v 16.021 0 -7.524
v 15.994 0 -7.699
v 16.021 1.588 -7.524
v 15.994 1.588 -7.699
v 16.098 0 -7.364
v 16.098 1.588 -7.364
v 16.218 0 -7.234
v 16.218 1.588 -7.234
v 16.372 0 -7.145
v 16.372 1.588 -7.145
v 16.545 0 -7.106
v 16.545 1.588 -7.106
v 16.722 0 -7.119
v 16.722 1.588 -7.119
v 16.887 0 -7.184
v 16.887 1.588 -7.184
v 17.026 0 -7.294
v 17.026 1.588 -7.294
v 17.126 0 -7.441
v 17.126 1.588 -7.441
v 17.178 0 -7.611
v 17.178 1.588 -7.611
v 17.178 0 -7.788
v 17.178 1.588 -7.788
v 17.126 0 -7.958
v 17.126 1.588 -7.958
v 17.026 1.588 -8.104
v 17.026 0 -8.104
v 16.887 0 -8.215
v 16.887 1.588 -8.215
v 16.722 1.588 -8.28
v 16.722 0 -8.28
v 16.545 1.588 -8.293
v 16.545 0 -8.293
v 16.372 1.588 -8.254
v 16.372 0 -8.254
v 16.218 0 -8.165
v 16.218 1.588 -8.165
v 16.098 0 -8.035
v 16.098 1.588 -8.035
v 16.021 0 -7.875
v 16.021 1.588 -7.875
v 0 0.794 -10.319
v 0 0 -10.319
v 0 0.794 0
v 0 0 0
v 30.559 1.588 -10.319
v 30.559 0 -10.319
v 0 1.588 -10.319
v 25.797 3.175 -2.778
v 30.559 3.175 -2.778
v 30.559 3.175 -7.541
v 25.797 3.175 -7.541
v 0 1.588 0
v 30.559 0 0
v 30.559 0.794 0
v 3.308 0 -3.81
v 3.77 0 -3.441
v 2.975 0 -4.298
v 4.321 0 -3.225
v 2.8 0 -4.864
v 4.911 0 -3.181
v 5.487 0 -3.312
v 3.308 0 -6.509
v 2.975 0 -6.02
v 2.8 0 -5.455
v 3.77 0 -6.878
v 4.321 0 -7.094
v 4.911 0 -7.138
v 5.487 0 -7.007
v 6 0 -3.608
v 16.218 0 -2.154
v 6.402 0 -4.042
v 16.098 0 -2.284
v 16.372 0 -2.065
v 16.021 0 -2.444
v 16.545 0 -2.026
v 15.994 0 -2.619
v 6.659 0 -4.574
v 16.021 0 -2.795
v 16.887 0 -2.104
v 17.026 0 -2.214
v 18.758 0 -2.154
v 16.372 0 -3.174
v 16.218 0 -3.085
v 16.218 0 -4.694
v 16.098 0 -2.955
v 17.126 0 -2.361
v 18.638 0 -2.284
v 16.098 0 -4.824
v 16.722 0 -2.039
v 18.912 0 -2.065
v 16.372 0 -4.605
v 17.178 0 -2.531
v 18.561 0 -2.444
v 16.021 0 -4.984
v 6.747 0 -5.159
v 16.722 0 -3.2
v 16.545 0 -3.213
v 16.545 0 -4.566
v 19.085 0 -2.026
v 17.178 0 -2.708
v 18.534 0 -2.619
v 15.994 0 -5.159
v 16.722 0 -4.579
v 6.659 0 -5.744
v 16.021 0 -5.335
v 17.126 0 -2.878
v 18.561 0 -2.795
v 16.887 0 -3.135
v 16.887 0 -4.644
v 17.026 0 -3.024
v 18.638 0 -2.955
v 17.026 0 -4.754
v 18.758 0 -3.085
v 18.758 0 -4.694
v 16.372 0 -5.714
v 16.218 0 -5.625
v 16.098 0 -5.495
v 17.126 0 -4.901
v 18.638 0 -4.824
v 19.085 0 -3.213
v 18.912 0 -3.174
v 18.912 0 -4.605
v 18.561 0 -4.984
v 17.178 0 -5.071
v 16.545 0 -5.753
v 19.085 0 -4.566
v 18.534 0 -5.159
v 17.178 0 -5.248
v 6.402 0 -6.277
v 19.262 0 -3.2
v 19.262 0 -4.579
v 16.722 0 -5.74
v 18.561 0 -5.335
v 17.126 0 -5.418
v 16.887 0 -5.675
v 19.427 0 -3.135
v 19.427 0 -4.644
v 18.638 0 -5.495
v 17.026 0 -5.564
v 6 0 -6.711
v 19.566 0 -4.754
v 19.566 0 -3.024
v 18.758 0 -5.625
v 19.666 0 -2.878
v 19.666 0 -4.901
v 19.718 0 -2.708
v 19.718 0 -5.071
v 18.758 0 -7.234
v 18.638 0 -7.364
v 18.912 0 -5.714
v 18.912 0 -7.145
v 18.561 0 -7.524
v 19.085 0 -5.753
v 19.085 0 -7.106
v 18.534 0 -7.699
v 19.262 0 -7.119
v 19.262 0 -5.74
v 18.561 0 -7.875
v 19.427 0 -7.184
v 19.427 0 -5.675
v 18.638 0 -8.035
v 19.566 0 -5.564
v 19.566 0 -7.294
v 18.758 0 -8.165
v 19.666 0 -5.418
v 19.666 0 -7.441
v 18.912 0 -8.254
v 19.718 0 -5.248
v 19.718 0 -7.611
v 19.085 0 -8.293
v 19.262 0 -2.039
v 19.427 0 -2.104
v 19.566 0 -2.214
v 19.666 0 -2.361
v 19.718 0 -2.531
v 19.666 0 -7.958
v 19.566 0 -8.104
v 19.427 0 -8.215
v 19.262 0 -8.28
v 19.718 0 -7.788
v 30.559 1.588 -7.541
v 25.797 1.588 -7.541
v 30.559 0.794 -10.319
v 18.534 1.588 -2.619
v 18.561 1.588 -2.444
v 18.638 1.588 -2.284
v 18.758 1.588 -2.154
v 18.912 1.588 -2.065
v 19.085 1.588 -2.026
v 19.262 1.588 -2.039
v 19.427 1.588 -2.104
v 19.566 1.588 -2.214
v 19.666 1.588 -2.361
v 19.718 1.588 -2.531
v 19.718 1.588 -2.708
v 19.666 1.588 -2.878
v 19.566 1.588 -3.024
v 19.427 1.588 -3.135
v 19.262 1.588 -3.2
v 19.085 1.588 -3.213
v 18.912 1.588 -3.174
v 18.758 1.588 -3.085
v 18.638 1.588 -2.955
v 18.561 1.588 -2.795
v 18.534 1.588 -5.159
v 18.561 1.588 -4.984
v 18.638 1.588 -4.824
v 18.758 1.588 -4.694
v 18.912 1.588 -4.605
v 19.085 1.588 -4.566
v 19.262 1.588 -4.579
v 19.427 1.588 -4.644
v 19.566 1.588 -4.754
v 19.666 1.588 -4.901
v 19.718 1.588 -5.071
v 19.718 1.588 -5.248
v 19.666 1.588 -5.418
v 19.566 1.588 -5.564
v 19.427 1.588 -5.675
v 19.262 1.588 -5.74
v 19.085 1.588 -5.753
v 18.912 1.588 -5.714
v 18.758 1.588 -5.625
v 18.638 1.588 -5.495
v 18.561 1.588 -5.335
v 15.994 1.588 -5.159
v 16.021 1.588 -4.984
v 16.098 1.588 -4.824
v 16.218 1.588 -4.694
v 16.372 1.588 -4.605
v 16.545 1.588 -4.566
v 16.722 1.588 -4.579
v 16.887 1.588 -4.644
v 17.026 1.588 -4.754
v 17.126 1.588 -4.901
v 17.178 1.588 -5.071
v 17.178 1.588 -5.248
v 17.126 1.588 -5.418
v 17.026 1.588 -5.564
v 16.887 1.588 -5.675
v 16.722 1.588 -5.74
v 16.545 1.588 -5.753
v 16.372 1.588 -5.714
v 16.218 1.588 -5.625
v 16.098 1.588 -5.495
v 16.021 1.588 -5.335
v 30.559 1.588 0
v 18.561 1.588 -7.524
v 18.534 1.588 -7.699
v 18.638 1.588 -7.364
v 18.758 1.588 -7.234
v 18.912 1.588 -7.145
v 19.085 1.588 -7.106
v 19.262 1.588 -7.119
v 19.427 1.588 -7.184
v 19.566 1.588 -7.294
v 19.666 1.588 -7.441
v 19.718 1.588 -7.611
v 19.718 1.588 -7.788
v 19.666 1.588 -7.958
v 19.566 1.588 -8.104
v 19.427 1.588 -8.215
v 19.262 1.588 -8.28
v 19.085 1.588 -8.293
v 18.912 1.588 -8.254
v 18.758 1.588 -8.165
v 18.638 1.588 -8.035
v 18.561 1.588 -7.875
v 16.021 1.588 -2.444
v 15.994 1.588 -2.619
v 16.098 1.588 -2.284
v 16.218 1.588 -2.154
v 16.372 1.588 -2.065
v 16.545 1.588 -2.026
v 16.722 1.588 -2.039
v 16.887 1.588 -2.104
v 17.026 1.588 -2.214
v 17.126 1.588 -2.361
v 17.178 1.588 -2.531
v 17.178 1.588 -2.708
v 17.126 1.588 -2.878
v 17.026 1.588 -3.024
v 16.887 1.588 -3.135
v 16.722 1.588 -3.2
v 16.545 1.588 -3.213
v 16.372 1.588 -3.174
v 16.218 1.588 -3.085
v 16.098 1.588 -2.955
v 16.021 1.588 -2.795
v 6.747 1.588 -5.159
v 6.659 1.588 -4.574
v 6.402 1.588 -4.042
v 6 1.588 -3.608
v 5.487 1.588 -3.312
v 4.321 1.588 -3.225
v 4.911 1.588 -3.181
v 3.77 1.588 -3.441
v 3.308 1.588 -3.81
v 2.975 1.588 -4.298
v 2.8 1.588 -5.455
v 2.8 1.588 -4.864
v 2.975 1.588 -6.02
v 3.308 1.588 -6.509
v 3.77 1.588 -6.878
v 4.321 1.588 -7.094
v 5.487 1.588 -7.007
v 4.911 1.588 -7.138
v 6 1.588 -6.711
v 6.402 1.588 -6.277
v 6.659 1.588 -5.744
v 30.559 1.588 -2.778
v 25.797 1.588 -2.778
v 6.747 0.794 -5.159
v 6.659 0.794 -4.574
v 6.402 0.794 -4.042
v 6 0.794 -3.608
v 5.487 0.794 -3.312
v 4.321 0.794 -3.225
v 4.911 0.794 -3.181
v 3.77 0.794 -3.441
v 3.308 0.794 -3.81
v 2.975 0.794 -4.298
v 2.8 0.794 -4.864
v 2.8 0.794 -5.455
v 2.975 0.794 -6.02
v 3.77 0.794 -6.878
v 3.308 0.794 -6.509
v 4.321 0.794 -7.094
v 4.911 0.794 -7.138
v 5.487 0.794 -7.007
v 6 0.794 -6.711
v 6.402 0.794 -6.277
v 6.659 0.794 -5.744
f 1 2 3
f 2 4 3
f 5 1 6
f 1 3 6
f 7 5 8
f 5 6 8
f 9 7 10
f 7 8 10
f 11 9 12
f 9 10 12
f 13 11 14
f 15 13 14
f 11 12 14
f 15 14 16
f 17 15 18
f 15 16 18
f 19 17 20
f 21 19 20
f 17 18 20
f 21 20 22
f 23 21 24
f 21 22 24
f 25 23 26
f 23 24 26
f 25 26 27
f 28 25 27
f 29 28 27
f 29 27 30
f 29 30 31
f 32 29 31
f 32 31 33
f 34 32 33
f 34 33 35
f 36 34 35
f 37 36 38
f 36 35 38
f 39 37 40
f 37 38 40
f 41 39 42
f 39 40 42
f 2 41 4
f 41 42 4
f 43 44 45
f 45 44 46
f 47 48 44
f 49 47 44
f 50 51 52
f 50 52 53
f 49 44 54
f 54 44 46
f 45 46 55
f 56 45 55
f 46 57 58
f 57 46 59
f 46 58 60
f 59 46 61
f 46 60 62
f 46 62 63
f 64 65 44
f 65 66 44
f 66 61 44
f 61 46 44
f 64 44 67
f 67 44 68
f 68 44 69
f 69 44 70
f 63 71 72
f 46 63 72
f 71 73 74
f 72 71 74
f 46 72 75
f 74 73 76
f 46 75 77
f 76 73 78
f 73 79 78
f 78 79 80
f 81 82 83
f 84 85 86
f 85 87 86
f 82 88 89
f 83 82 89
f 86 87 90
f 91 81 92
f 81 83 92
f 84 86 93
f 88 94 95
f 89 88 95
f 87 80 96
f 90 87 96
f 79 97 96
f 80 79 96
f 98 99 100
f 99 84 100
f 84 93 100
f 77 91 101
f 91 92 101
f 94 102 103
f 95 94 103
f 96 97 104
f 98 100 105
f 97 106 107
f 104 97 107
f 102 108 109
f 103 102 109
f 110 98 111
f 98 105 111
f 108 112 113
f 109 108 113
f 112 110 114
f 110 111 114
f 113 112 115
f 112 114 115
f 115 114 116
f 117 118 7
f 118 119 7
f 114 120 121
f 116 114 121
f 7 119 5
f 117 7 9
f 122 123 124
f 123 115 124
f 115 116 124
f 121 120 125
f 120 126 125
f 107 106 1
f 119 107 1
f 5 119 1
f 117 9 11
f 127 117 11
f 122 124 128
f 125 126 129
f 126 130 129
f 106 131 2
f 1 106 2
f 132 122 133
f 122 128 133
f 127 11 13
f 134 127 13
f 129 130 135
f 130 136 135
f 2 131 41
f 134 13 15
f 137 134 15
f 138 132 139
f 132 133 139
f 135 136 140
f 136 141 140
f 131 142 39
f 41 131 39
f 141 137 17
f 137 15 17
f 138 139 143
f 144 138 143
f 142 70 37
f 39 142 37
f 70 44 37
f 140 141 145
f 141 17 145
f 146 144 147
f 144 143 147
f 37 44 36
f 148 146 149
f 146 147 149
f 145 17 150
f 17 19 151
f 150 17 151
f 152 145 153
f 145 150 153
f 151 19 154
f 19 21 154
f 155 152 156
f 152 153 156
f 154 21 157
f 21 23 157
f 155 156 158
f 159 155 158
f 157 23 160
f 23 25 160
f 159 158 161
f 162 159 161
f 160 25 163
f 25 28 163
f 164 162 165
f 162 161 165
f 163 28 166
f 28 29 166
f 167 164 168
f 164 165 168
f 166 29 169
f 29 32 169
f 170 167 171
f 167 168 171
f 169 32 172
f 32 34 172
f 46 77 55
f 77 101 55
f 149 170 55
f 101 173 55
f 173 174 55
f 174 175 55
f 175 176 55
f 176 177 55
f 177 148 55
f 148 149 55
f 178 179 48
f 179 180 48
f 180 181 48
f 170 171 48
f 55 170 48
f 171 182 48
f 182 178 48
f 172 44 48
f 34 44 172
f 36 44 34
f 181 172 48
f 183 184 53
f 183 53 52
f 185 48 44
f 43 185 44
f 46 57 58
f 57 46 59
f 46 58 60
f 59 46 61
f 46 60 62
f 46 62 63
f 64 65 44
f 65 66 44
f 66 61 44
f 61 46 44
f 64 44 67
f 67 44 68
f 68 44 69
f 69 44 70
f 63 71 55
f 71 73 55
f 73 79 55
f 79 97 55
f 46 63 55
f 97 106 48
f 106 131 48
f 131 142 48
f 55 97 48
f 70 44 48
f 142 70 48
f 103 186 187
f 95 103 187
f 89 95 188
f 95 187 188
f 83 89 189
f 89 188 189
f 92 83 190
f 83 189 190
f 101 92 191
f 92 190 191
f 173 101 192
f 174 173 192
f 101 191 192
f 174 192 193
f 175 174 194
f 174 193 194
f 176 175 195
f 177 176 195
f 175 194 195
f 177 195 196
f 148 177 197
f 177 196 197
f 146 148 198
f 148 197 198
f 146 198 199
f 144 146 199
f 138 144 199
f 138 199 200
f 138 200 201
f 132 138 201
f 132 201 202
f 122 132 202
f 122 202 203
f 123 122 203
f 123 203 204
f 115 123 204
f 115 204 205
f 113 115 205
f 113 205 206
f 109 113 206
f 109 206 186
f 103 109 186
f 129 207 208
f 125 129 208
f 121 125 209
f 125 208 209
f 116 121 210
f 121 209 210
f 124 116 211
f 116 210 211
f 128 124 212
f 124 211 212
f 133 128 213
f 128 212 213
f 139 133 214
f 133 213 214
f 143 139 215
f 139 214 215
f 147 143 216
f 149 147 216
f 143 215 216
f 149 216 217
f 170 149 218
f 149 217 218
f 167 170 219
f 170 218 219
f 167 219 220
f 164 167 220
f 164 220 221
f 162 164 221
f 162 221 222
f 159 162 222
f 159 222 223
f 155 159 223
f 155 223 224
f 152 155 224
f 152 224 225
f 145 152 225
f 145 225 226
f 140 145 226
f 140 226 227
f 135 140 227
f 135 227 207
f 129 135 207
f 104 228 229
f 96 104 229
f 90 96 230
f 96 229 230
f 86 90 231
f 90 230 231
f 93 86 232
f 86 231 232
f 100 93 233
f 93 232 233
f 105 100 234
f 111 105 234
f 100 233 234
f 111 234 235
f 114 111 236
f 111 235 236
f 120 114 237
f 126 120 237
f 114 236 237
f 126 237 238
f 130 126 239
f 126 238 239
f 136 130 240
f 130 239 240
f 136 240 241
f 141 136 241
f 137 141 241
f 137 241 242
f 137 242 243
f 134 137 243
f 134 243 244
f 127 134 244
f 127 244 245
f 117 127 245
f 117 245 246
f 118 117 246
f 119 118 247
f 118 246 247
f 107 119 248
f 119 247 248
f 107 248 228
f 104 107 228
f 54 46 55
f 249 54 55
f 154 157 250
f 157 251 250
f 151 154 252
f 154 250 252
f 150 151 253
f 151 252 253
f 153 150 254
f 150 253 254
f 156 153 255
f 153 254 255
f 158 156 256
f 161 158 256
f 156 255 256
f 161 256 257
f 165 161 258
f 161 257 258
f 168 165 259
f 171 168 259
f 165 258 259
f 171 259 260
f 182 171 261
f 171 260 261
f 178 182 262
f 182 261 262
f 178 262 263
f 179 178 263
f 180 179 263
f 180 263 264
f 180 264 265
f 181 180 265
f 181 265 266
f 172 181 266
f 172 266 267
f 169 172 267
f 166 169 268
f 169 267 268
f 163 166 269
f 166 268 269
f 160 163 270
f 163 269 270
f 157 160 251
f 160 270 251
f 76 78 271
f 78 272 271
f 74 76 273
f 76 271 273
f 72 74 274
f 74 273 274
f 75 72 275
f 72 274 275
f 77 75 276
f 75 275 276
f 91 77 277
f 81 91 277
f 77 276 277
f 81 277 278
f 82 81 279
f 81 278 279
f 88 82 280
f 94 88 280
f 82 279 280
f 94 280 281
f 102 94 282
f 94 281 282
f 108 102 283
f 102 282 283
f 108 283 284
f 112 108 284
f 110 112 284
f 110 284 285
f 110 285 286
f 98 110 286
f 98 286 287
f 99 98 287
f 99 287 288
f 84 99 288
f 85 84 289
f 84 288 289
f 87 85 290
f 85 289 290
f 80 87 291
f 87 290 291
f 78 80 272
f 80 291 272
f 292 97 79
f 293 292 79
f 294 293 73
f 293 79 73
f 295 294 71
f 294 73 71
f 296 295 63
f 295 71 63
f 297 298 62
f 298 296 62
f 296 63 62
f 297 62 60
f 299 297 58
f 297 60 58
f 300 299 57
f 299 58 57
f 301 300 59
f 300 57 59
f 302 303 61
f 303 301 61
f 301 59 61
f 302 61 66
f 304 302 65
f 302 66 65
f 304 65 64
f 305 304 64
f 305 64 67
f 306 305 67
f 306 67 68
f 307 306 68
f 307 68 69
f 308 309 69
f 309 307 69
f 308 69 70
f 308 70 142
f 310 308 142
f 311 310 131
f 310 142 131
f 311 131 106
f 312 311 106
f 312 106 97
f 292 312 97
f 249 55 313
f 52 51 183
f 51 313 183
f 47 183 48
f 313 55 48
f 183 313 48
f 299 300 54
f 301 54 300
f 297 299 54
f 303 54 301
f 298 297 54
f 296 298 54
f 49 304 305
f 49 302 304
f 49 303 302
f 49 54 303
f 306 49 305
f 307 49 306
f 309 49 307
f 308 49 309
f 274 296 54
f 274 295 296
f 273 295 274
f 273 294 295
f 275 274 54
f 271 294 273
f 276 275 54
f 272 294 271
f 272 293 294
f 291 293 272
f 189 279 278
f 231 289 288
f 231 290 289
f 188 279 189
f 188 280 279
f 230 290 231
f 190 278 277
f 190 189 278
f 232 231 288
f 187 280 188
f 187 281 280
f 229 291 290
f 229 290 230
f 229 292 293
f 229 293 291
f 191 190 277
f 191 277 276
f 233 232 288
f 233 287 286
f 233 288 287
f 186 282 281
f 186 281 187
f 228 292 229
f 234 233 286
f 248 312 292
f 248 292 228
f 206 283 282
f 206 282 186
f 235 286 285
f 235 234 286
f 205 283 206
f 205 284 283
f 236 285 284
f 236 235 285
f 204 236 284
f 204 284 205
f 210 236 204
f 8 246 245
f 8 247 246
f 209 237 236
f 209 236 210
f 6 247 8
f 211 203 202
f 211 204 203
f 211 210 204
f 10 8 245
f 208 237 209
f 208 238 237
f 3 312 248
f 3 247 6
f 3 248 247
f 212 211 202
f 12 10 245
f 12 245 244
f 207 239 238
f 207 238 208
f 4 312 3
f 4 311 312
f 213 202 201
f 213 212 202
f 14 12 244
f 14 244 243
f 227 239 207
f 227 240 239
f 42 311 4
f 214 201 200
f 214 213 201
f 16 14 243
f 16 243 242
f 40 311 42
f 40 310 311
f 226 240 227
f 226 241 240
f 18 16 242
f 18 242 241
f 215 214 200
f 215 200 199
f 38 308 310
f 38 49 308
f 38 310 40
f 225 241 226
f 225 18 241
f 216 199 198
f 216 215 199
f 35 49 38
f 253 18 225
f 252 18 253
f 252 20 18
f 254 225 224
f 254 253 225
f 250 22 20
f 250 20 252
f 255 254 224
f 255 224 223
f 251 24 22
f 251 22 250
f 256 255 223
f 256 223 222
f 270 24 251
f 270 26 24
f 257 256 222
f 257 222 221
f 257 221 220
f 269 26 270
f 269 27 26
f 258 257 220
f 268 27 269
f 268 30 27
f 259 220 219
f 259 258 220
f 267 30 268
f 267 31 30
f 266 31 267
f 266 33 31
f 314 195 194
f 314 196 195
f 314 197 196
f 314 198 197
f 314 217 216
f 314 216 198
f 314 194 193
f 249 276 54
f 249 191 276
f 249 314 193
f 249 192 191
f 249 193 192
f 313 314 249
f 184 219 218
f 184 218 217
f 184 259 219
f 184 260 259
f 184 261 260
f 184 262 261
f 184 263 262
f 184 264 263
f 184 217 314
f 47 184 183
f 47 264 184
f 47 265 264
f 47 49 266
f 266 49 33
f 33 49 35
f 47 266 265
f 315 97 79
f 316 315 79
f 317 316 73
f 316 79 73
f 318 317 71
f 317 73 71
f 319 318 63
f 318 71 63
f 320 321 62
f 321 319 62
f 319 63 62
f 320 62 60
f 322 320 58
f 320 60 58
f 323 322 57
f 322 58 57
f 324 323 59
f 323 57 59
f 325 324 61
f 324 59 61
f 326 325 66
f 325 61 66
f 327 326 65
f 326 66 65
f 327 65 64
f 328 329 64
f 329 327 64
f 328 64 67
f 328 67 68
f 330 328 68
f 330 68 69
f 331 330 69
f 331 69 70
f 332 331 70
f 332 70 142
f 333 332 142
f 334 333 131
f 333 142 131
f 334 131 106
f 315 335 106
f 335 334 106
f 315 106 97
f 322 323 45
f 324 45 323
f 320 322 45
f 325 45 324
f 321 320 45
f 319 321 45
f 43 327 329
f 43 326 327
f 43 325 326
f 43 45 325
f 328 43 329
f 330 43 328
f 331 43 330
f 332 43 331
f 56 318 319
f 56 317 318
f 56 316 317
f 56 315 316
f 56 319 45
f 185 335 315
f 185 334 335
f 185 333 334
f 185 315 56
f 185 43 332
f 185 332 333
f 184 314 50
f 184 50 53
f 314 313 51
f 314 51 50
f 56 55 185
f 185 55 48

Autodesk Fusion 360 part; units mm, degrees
sketch "Sketch1" plane through (0, 0, 0) normal (0, 1, 0) x (1, 0, 0)
  circle A0 centre (0, 0) radius 4.7625
  circle A1 centre (0, 0) radius 1.9844
  dimension "d1" = 9.525
  dimension "d2" = 3.9688
extrude "Extrude1" add sketch "Sketch1" along normal blind 0.7937
equation "d1 = ( 3 / 8 ) * 1 in"
equation "d2 = ( 5 / 32 ) * 1 in"
equation "d3 = ( 1 / 32 ) * 1 in"

Autodesk Fusion 360 part; units mm, degrees
sketch "Sketch1" plane through (0, 0, 0) normal (0, 1, 0) x (1, 0, 0) in component "Fast Light Board"
  line L0 (0, 0) -> (30.5594, 0)
  line L1 (30.5594, 0) -> (30.5594, 10.3188)
  line L2 (30.5594, 10.3188) -> (0, 10.3188)
  line L3 (0, 10.3188) -> (0, 0)
  circle A0 centre (4.7625, 5.1594) radius 1.9844
  dimension "d1" = 10.3188
  dimension "d2" = 30.5594
  dimension "d4" = 3.9688
extrude "Extrude1" add sketch "Sketch1" along normal blind 1.5875 in component "Fast Light Board"
sketch "Sketch2" plane through (0, 1.5875, 0) normal (0, 1, 0) x (-1, 0, 0) in component "Fast Light Board"
  circle A0 centre (-4.7625, -5.1594) radius 1.9844
  line L0 (0, -10.3188) -> (0, 0)
  line L1 (0, 0) -> (-30.5594, 0)
  line L2 (-30.5594, 0) -> (-30.5594, -10.3188)
  line L3 (-30.5594, -10.3188) -> (0, -10.3188)
  line L4 (-25.7969, -5.1594) -> (-25.7969, -7.5406)
  line L5 (-25.7969, -7.5406) -> (-30.5594, -7.5406)
  line L6 (-30.5594, -5.1594) -> (-30.5594, -7.5406)
  line L7 (-30.5594, -5.1594) -> (-30.5594, -2.7781)
  line L8 (-30.5594, -2.7781) -> (-25.7969, -2.7781)
  line L9 (-25.7969, -2.7781) -> (-25.7969, -5.1594)
  dimension "d7" = 4.7625
extrude "Extrude2" add sketch "Sketch2" along normal blind 1.5875 contours L2 L4 L5 L6 L7 L8 L9 in component "Fast Light Board"
sketch "Sketch3" plane through (0, 1.5875, 0) normal (0, 1, 0) x (-1, 0, 0) in component "Fast Light Board"
  line L0 (-25.7969, -7.5406) -> (-30.5594, -7.5406)
  line L1 (-30.5594, -7.5406) -> (-30.5594, -10.3188)
  line L2 (-30.5594, -10.3188) -> (0, -10.3188)
  line L3 (0, -10.3188) -> (0, 0)
  line L4 (0, 0) -> (-30.5594, 0)
  line L5 (-30.5594, 0) -> (-30.5594, -2.7781)
  line L6 (-30.5594, -2.7781) -> (-25.7969, -2.7781)
  line L7 (-25.7969, -2.7781) -> (-25.7969, -7.5406)
  circle A0 centre (-4.7625, -5.1594) radius 1.9844
  line L8 (-30.5594, -5.1594) -> (-17.8594, -5.1594)
  line L9 (-17.8594, -5.1594) -> (-19.1294, -5.1594)
  circle A1 centre (-19.1294, -5.1594) radius 0.5953
  circle A2 centre (-16.5894, -5.1594) radius 0.5953
  circle A3 centre (-19.1294, -7.6994) radius 0.5953
  circle A4 centre (-16.5894, -7.6994) radius 0.5953
  circle A5 centre (-16.5894, -2.6194) radius 0.5953
  circle A6 centre (-19.1294, -2.6194) radius 0.5953
  dimension "d12" = 12.7
  dimension "d13" = 1.27
  dimension "d14" = 1.1906
  dimension "d15" = 1.1906
  dimension "d16" = 1.1906
  dimension "d17" = 1.1906
  dimension "d18" = 1.1906
  dimension "d19" = 1.1906
extrude "Extrude3" cut sketch "Sketch3" against normal blind 1.5875 contours L8 L9 A1 | L8 L9 A1 | A2 | A3 | A4 | A5 | A6 in component "Fast Light Board"
component "Fast Light Board" placed x (1, 0, 0) y (0, 1, 0) z (0, 0, 1) at (0, 0, 0)
equation "d1 = ( 13 / 32 ) * 1 in"
equation "d2 = 1 13/64\""
equation "d4 = ( 5 / 32 ) * 1 in"
equation "d5 = ( 1 / 16 ) * 1 in"
equation "d7 = ( 3 / 16 ) * 1 in"
equation "d10 = ( 1 / 16 ) * 1 in"
equation "d14 = ( 3 / 64 ) * 1 in"
equation "d15 = ( 3 / 64 ) * 1 in"
equation "d16 = ( 3 / 64 ) * 1 in"
equation "d17 = ( 3 / 64 ) * 1 in"
equation "d18 = ( 3 / 64 ) * 1 in"
equation "d19 = ( 3 / 64 ) * 1 in"
equation "d20 = ( -1 / 16 ) * 1 in"
properties part number "fast-rgb-led-insert"
